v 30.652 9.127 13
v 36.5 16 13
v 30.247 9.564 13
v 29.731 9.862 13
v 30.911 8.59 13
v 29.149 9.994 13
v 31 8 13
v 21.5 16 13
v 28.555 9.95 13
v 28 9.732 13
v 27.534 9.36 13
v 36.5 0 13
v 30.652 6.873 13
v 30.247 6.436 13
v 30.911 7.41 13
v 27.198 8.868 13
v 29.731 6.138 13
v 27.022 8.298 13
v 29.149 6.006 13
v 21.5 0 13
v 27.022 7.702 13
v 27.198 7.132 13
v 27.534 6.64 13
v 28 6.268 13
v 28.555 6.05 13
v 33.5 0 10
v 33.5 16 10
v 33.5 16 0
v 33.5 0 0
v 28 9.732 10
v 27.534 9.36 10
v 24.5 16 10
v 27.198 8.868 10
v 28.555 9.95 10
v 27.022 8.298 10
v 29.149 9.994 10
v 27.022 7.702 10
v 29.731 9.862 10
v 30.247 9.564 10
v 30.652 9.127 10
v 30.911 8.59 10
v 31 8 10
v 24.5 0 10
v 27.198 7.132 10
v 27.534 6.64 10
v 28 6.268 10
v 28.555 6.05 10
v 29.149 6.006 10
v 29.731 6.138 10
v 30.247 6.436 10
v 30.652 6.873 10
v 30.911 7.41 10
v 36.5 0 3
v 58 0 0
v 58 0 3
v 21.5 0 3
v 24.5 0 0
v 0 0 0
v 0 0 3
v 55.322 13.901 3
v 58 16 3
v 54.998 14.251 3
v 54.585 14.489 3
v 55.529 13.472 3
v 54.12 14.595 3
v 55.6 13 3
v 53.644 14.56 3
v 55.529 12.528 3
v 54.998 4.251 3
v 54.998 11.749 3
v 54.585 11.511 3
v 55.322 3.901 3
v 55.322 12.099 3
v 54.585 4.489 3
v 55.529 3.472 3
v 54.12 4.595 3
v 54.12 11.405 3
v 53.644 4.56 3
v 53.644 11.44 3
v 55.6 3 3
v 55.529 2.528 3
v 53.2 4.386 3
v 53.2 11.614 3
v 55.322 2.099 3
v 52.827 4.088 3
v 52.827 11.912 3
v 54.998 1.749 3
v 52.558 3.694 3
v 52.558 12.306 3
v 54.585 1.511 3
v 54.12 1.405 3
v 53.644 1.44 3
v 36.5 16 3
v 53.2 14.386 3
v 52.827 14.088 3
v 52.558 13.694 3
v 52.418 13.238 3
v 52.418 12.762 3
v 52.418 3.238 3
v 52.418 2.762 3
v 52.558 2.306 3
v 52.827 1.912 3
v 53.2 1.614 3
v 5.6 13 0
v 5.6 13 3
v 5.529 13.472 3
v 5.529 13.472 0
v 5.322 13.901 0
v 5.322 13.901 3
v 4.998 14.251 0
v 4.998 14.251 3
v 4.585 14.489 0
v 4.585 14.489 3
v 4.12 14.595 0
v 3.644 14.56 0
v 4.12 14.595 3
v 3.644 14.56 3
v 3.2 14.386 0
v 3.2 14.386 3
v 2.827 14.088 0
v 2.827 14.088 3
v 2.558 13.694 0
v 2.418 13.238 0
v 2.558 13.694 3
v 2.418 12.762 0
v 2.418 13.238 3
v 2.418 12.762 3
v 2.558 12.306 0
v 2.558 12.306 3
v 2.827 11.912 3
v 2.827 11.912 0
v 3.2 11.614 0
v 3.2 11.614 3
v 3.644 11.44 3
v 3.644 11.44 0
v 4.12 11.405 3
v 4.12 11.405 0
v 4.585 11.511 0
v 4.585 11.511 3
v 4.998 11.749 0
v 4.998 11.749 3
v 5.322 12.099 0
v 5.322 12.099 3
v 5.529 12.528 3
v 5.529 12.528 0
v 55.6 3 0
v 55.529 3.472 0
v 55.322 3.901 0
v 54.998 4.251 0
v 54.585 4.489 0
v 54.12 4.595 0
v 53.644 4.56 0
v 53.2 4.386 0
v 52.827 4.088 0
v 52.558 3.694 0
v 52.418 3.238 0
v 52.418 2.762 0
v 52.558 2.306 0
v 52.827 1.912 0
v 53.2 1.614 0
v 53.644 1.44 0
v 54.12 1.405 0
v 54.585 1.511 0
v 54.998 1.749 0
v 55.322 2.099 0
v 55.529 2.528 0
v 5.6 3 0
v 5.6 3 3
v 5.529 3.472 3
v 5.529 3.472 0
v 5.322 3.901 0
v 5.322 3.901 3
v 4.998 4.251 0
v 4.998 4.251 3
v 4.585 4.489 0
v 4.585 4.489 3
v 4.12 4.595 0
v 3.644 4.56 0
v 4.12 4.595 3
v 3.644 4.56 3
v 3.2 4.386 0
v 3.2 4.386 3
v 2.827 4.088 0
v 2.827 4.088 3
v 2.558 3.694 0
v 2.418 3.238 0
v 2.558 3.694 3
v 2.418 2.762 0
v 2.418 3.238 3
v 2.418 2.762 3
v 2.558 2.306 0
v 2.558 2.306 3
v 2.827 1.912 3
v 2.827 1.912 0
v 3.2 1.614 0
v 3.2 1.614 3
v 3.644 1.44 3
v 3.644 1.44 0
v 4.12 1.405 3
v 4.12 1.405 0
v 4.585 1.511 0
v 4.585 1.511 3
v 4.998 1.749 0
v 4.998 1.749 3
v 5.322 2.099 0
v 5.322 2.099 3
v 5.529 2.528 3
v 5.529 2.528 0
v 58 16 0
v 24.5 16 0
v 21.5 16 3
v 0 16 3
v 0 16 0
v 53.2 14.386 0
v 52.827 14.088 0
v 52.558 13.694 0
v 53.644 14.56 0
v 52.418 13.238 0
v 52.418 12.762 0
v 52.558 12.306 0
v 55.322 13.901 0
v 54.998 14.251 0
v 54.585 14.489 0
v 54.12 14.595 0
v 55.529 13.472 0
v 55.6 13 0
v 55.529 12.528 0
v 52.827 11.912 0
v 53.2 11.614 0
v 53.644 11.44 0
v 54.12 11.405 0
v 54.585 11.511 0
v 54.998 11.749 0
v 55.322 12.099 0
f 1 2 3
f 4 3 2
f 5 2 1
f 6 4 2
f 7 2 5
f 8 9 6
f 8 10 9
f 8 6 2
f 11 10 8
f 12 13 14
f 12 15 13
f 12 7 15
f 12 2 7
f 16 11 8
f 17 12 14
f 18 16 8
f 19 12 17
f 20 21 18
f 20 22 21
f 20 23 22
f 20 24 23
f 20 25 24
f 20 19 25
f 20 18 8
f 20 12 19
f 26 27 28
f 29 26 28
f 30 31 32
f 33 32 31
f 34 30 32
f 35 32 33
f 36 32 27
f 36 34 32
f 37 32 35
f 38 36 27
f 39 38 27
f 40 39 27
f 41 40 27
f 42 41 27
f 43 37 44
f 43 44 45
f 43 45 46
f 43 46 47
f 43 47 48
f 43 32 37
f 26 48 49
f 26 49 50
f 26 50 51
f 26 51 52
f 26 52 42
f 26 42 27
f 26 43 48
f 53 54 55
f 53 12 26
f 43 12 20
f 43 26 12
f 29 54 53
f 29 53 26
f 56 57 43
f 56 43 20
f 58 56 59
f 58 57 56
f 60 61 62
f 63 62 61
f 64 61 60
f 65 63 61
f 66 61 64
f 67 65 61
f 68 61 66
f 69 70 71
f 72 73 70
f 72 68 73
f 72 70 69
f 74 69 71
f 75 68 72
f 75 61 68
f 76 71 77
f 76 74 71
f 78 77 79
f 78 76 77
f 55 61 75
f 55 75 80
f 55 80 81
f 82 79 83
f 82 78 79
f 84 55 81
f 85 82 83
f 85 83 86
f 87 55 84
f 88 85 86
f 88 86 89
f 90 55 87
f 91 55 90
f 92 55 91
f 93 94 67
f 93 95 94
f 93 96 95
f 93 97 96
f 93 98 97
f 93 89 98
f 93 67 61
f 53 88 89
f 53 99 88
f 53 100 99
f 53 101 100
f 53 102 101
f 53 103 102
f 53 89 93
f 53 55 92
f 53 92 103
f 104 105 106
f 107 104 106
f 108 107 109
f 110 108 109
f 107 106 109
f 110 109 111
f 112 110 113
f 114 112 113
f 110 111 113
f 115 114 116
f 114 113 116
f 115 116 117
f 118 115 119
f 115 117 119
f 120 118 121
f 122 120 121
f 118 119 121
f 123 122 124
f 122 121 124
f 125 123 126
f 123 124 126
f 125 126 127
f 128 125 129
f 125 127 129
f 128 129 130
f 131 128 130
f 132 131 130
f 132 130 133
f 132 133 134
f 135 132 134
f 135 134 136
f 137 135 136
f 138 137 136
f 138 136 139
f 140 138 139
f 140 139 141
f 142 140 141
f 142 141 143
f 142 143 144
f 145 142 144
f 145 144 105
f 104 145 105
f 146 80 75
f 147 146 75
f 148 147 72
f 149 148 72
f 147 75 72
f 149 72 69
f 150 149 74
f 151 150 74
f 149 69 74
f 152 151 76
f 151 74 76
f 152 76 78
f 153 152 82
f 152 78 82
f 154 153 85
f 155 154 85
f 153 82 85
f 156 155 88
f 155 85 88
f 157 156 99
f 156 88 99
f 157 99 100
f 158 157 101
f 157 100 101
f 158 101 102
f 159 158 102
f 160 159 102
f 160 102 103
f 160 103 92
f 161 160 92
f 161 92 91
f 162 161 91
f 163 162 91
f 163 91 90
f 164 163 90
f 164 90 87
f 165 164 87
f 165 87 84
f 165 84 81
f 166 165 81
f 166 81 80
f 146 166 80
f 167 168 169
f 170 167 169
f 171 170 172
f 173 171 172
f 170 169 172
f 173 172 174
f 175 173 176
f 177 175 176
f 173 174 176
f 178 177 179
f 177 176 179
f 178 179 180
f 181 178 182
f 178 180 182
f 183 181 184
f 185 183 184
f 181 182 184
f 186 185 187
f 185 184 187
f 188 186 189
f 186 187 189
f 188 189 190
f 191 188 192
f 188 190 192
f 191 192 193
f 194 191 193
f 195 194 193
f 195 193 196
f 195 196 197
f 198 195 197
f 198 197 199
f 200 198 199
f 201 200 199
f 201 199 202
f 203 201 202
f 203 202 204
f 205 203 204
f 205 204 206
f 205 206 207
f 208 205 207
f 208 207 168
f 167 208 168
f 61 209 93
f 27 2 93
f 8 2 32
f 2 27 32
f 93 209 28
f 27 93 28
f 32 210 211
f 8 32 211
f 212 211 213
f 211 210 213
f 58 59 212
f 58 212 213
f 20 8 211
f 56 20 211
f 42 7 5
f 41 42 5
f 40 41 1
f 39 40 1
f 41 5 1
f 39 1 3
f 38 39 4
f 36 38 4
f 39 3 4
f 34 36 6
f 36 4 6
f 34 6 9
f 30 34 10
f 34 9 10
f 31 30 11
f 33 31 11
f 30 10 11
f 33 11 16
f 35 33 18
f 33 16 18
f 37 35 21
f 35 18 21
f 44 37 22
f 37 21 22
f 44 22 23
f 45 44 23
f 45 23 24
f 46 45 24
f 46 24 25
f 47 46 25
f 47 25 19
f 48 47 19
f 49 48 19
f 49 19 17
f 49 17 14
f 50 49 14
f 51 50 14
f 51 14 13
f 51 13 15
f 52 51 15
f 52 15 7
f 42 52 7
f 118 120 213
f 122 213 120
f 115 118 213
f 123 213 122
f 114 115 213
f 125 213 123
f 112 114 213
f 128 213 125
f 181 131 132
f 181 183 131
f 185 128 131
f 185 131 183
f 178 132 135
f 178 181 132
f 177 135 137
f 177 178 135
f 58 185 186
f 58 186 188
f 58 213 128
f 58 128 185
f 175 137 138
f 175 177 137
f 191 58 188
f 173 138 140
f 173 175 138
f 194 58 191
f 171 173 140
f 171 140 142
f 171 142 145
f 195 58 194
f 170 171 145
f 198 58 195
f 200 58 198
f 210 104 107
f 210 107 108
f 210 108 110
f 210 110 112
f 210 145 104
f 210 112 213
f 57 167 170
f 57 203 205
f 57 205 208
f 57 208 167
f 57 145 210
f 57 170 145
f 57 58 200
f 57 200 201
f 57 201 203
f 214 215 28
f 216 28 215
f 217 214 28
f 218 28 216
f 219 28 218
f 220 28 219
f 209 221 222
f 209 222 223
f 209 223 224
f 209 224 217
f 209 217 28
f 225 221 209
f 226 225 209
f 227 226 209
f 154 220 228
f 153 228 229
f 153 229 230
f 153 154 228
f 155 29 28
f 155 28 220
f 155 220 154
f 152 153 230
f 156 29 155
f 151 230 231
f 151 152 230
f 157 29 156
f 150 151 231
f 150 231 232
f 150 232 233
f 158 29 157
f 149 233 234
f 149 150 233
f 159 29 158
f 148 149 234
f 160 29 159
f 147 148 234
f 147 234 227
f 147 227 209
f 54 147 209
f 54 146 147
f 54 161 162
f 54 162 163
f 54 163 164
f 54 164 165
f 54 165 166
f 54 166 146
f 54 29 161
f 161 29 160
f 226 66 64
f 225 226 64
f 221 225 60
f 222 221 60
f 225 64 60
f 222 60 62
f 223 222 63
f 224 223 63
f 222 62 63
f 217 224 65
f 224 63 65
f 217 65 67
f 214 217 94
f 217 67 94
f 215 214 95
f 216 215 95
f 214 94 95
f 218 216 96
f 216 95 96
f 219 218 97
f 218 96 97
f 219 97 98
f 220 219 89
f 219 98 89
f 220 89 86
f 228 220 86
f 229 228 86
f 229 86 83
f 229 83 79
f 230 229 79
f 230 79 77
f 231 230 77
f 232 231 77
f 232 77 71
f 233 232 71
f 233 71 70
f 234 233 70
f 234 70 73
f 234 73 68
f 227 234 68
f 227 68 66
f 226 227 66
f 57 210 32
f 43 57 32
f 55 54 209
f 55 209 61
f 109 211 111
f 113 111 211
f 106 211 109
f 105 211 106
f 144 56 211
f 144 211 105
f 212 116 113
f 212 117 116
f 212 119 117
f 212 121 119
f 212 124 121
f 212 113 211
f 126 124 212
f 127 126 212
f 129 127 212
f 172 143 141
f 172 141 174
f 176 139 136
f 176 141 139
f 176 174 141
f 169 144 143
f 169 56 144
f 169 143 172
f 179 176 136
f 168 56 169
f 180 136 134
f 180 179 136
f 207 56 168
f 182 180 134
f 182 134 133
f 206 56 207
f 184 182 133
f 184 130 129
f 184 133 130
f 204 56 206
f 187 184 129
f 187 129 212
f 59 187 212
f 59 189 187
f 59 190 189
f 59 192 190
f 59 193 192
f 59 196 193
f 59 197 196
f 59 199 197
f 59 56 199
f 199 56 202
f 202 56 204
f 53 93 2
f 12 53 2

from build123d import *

# Parameters (mm, degrees)
EXTRUDE_1_DEPTH     = 16
SKETCH_2_R          = 2
SKETCH_2_R_2        = 1.59996579
CUT_EXTRUDE_1_DEPTH = 16


with BuildPart() as part:
    # 草图1 → 凸台-拉伸1 (new body)
    with BuildSketch(Plane(origin=(0, 0, 0), x_dir=(1, 0, 0), z_dir=(0, 1, 0))):
        Polygon((0, 0), (24.5, 0), (24.5, -10), (33.5, -10), (33.5, 0), (58, 0), (58, -3), (36.5, -3), (36.5, -13), (21.5, -13), (21.5, -3), (0, -3), align=None)
    extrude(amount=EXTRUDE_1_DEPTH)

    # 草图2 → 切除-拉伸1 (cut)
    with BuildSketch(Plane.XY.offset(13)):
        with Locations((29, 8)):
            Circle(SKETCH_2_R)
        with Locations((4, 13)):
            Circle(SKETCH_2_R_2)
        with Locations((4, 3)):
            Circle(SKETCH_2_R_2)
        with Locations((54, 13)):
            Circle(SKETCH_2_R_2)
        with Locations((54, 3)):
            Circle(SKETCH_2_R_2)
    extrude(amount=-CUT_EXTRUDE_1_DEPTH, mode=Mode.SUBTRACT)


solid = part.part
